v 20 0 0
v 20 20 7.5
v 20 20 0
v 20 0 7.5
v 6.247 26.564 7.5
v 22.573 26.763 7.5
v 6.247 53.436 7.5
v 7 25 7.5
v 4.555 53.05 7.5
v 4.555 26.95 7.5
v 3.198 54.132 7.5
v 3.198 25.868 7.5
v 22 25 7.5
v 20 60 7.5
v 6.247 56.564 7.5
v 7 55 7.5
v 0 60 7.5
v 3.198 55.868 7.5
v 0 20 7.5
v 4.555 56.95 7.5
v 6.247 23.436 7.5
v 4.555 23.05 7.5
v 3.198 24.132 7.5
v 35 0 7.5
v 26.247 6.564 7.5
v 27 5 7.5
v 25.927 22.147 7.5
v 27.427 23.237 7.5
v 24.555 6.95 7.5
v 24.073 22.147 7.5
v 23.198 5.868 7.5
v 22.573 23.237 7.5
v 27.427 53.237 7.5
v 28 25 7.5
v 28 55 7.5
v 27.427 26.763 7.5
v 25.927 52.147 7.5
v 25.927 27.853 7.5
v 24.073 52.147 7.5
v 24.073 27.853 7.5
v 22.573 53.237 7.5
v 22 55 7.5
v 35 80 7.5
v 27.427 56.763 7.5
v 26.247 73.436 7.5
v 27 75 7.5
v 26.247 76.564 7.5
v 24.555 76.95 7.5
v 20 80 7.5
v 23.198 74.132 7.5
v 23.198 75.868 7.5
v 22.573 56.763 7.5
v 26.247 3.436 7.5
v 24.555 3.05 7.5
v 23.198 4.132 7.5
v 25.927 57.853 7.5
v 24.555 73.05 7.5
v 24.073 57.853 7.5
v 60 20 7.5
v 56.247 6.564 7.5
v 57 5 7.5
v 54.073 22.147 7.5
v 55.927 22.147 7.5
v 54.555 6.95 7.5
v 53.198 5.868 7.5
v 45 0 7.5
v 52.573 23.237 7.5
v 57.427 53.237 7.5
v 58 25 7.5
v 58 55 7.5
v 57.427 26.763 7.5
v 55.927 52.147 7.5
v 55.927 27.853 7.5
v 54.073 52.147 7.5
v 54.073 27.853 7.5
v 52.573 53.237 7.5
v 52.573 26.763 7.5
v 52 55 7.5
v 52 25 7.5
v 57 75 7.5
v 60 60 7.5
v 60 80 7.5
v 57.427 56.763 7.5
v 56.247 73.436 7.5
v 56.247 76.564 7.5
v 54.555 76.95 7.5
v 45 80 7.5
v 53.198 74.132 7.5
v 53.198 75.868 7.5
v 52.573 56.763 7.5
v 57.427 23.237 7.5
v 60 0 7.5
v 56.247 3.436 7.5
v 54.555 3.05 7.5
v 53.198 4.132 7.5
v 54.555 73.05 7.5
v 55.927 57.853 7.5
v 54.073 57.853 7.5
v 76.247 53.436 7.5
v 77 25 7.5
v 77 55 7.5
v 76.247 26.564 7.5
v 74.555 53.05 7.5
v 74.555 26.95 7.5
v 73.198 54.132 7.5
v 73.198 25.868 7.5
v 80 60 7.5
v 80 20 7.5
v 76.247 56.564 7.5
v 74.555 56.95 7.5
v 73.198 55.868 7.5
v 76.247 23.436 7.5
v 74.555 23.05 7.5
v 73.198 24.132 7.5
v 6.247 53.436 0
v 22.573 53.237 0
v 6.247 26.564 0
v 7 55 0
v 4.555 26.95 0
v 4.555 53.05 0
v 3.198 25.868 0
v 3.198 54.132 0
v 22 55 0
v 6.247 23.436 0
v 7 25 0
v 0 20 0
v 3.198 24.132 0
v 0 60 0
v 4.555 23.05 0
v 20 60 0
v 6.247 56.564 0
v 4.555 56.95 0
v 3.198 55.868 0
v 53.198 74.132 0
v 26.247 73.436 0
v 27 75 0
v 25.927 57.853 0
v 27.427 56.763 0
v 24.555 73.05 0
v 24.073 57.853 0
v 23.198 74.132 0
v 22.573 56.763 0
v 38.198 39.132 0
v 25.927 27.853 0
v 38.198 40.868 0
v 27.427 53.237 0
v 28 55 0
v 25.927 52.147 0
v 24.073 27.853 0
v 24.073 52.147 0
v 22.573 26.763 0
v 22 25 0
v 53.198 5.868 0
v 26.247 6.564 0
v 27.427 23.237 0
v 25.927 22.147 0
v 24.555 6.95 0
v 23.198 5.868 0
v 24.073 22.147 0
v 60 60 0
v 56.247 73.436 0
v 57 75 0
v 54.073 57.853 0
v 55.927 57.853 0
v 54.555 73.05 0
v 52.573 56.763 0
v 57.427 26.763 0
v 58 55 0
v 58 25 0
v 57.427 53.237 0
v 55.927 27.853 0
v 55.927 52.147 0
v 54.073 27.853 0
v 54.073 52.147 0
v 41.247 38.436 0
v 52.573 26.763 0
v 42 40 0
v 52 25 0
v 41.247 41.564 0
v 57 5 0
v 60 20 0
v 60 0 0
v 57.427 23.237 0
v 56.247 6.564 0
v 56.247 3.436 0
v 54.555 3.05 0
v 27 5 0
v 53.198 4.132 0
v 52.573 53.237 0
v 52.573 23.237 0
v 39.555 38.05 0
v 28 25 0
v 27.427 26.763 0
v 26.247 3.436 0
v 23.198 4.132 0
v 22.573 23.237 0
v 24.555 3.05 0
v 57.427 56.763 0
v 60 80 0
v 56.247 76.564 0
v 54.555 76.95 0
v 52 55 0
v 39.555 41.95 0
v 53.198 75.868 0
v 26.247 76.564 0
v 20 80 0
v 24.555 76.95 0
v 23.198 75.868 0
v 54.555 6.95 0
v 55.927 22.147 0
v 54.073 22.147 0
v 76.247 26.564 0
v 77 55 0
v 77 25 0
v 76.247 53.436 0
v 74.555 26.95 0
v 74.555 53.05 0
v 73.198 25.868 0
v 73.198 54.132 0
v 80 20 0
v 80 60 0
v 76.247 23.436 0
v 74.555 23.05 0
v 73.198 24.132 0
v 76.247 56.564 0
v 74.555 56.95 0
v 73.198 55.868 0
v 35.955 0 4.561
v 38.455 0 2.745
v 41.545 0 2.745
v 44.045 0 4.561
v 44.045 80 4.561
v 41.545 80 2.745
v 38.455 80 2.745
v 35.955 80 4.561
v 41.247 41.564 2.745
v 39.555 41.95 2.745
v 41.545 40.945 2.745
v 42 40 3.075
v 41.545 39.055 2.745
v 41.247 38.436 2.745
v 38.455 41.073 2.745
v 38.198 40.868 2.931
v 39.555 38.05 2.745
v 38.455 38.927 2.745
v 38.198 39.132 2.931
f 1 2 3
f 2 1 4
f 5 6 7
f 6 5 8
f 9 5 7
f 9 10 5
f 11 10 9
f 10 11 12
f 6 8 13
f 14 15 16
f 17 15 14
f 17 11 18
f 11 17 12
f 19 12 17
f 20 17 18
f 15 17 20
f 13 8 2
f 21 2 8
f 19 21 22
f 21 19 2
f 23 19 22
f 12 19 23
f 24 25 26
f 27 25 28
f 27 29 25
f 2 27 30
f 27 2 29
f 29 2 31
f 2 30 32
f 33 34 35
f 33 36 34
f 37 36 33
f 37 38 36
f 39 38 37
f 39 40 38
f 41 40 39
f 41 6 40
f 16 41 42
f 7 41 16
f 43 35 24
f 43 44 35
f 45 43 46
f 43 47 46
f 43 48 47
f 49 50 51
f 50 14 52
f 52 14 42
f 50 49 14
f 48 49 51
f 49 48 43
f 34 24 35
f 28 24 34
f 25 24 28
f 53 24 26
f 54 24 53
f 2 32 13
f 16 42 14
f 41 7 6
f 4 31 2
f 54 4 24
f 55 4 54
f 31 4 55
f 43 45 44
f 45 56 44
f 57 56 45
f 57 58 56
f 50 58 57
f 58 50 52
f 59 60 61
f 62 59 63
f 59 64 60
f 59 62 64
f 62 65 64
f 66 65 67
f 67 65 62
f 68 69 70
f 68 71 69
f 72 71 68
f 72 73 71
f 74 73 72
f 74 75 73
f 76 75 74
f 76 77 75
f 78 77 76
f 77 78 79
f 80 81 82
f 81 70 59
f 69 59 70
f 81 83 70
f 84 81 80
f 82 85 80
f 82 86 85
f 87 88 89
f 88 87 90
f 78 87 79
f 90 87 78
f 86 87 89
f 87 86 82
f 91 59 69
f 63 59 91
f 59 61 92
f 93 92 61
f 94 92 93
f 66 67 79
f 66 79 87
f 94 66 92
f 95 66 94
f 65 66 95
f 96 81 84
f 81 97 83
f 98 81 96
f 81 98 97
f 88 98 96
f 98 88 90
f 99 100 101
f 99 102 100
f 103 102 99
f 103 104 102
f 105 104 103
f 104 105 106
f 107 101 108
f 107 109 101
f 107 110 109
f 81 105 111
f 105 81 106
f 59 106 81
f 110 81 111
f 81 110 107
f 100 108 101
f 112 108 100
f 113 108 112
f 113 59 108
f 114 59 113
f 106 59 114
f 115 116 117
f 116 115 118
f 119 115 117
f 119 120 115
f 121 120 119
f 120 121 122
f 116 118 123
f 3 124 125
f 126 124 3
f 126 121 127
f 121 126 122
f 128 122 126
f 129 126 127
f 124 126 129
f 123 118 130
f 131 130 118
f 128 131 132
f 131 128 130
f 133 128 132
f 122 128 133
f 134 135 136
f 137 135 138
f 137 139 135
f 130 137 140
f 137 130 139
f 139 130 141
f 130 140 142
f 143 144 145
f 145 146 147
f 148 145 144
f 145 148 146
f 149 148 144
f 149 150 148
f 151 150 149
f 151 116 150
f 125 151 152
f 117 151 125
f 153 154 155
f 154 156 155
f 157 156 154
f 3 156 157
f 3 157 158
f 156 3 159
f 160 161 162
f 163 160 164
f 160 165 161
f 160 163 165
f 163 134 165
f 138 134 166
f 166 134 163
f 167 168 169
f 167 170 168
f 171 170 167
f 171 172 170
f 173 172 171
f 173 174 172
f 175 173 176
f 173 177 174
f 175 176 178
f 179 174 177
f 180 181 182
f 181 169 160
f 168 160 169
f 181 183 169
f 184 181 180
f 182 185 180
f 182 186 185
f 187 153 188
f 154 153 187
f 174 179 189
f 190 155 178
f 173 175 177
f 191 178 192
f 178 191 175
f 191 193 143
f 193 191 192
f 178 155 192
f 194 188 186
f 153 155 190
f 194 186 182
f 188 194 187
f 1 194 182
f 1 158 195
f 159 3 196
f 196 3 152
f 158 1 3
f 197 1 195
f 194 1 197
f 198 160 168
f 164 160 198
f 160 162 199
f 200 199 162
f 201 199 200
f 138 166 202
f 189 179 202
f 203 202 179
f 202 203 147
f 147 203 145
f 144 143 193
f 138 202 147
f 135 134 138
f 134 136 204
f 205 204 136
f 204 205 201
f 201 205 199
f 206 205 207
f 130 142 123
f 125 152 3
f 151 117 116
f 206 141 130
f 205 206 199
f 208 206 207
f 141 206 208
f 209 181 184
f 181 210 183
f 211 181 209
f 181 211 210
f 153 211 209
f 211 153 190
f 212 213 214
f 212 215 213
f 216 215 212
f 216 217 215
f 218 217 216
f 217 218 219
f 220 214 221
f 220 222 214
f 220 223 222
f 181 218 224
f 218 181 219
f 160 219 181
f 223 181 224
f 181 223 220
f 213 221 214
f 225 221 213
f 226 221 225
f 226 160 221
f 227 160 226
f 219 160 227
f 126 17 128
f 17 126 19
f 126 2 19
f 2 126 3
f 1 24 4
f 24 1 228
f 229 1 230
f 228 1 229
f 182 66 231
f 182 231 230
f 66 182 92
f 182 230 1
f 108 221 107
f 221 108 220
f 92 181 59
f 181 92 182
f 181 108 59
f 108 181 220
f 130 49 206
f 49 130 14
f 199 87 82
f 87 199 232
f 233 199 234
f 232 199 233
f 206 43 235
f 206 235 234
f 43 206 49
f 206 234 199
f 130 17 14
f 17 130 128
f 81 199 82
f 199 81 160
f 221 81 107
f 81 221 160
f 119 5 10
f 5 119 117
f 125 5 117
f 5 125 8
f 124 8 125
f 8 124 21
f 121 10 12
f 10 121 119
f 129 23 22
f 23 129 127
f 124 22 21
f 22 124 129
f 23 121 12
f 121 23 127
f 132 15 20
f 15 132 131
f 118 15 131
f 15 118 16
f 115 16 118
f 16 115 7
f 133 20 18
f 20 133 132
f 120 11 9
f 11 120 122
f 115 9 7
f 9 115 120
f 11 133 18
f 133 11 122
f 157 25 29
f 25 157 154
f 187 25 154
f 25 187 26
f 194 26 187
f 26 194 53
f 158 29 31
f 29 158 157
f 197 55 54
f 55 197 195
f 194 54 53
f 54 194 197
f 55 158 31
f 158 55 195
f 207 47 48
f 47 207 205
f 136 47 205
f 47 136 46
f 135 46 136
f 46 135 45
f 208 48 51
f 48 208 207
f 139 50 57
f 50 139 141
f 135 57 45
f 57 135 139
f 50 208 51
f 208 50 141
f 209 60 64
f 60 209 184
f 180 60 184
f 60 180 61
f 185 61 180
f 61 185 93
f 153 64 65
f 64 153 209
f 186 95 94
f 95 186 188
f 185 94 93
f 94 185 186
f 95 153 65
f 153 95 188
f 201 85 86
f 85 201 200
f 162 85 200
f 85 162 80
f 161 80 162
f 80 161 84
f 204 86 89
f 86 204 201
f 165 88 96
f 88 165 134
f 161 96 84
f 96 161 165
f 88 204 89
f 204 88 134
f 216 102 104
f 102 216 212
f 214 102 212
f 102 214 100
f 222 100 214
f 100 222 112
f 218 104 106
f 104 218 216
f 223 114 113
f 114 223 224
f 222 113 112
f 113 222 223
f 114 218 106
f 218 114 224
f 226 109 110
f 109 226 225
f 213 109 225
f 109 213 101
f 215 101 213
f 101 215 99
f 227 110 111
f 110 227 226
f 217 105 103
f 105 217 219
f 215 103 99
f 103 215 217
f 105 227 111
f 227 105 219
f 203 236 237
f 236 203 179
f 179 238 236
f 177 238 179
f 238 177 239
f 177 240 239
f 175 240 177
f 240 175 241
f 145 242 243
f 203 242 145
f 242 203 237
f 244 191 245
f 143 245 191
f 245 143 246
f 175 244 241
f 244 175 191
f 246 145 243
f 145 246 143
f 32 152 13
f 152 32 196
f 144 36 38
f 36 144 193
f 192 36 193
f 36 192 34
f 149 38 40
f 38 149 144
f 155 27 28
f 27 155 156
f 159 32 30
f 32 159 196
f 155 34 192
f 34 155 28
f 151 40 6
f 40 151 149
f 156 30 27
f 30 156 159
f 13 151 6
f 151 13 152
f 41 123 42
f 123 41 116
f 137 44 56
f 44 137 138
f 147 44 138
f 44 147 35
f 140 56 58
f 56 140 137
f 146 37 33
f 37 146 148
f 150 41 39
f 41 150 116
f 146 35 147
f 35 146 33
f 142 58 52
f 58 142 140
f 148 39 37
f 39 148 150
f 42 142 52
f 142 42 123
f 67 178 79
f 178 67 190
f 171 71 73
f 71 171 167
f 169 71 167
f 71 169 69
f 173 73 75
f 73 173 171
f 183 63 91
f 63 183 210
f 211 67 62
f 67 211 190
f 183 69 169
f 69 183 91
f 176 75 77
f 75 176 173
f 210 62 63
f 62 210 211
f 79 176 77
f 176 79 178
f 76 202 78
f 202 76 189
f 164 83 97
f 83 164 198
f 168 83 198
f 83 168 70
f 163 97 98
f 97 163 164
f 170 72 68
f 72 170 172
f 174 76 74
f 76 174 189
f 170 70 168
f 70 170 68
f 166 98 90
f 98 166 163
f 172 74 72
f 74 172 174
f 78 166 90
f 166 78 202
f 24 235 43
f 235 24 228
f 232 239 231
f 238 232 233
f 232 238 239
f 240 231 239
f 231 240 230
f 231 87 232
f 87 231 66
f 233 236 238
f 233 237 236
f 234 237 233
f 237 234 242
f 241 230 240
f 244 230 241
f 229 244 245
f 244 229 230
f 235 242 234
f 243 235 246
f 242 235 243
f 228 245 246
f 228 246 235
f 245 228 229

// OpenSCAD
// file: hardware.scad
axle_r = 5;
axle_separation = 30;

module axle(h) {
	rotate(v=[-1,0,0], a=90) cylinder(r=axle_r, h=h, $fn=10);
}

module axlepair(h=100) {
	union() {
		axle(h);
		translate(v=[axle_separation, 0, 0]) axle(h);
	}
}

module m3(h=16) {
	union() {
		cylinder(r=3.25, h=3);
		cylinder(r=2, h=h);
	}
}

module m5(h=16) {
	union() {
		cylinder(r=4.5, h=5);
		cylinder(r=3, h=h);
	}
}
// main file
include <hardware.scad>

module brock() {
	h = 1.5 * axle_r;
	echo(h);
	corner = 20;
	width = 80;
	screw = 5;
	z_off = -6;

	difference() {
		cube([width, width, h]);

		for (v = [[0,0,0],[width-corner,0,0],
				[0,width-corner,0],[width-corner,width-corner,0]]) 
			translate(v=v) cube([corner, corner, h]);

		for (v = [[screw, corner+screw, z_off],
				[screw, width-(corner+screw), z_off],
				[corner+screw, screw, z_off],
				[corner+screw, width-screw, z_off],
				[width-(corner+screw), screw, z_off],
				[width-(corner+screw), width-screw, z_off],
				[width-screw, corner+screw, z_off],
				[width-screw, width-(corner+screw), z_off],
				[width/2, width/2, z_off]])
			translate(v=v) m3();

		for (x=[corner+screw, width-(corner+screw)])
			for (y=[corner+screw, width-(corner+screw)])
				translate(v=[x,y,z_off]) m5();

		translate(v=[width/2,-0.5,h]) axle(h=width+1);
	}
}

brock();
